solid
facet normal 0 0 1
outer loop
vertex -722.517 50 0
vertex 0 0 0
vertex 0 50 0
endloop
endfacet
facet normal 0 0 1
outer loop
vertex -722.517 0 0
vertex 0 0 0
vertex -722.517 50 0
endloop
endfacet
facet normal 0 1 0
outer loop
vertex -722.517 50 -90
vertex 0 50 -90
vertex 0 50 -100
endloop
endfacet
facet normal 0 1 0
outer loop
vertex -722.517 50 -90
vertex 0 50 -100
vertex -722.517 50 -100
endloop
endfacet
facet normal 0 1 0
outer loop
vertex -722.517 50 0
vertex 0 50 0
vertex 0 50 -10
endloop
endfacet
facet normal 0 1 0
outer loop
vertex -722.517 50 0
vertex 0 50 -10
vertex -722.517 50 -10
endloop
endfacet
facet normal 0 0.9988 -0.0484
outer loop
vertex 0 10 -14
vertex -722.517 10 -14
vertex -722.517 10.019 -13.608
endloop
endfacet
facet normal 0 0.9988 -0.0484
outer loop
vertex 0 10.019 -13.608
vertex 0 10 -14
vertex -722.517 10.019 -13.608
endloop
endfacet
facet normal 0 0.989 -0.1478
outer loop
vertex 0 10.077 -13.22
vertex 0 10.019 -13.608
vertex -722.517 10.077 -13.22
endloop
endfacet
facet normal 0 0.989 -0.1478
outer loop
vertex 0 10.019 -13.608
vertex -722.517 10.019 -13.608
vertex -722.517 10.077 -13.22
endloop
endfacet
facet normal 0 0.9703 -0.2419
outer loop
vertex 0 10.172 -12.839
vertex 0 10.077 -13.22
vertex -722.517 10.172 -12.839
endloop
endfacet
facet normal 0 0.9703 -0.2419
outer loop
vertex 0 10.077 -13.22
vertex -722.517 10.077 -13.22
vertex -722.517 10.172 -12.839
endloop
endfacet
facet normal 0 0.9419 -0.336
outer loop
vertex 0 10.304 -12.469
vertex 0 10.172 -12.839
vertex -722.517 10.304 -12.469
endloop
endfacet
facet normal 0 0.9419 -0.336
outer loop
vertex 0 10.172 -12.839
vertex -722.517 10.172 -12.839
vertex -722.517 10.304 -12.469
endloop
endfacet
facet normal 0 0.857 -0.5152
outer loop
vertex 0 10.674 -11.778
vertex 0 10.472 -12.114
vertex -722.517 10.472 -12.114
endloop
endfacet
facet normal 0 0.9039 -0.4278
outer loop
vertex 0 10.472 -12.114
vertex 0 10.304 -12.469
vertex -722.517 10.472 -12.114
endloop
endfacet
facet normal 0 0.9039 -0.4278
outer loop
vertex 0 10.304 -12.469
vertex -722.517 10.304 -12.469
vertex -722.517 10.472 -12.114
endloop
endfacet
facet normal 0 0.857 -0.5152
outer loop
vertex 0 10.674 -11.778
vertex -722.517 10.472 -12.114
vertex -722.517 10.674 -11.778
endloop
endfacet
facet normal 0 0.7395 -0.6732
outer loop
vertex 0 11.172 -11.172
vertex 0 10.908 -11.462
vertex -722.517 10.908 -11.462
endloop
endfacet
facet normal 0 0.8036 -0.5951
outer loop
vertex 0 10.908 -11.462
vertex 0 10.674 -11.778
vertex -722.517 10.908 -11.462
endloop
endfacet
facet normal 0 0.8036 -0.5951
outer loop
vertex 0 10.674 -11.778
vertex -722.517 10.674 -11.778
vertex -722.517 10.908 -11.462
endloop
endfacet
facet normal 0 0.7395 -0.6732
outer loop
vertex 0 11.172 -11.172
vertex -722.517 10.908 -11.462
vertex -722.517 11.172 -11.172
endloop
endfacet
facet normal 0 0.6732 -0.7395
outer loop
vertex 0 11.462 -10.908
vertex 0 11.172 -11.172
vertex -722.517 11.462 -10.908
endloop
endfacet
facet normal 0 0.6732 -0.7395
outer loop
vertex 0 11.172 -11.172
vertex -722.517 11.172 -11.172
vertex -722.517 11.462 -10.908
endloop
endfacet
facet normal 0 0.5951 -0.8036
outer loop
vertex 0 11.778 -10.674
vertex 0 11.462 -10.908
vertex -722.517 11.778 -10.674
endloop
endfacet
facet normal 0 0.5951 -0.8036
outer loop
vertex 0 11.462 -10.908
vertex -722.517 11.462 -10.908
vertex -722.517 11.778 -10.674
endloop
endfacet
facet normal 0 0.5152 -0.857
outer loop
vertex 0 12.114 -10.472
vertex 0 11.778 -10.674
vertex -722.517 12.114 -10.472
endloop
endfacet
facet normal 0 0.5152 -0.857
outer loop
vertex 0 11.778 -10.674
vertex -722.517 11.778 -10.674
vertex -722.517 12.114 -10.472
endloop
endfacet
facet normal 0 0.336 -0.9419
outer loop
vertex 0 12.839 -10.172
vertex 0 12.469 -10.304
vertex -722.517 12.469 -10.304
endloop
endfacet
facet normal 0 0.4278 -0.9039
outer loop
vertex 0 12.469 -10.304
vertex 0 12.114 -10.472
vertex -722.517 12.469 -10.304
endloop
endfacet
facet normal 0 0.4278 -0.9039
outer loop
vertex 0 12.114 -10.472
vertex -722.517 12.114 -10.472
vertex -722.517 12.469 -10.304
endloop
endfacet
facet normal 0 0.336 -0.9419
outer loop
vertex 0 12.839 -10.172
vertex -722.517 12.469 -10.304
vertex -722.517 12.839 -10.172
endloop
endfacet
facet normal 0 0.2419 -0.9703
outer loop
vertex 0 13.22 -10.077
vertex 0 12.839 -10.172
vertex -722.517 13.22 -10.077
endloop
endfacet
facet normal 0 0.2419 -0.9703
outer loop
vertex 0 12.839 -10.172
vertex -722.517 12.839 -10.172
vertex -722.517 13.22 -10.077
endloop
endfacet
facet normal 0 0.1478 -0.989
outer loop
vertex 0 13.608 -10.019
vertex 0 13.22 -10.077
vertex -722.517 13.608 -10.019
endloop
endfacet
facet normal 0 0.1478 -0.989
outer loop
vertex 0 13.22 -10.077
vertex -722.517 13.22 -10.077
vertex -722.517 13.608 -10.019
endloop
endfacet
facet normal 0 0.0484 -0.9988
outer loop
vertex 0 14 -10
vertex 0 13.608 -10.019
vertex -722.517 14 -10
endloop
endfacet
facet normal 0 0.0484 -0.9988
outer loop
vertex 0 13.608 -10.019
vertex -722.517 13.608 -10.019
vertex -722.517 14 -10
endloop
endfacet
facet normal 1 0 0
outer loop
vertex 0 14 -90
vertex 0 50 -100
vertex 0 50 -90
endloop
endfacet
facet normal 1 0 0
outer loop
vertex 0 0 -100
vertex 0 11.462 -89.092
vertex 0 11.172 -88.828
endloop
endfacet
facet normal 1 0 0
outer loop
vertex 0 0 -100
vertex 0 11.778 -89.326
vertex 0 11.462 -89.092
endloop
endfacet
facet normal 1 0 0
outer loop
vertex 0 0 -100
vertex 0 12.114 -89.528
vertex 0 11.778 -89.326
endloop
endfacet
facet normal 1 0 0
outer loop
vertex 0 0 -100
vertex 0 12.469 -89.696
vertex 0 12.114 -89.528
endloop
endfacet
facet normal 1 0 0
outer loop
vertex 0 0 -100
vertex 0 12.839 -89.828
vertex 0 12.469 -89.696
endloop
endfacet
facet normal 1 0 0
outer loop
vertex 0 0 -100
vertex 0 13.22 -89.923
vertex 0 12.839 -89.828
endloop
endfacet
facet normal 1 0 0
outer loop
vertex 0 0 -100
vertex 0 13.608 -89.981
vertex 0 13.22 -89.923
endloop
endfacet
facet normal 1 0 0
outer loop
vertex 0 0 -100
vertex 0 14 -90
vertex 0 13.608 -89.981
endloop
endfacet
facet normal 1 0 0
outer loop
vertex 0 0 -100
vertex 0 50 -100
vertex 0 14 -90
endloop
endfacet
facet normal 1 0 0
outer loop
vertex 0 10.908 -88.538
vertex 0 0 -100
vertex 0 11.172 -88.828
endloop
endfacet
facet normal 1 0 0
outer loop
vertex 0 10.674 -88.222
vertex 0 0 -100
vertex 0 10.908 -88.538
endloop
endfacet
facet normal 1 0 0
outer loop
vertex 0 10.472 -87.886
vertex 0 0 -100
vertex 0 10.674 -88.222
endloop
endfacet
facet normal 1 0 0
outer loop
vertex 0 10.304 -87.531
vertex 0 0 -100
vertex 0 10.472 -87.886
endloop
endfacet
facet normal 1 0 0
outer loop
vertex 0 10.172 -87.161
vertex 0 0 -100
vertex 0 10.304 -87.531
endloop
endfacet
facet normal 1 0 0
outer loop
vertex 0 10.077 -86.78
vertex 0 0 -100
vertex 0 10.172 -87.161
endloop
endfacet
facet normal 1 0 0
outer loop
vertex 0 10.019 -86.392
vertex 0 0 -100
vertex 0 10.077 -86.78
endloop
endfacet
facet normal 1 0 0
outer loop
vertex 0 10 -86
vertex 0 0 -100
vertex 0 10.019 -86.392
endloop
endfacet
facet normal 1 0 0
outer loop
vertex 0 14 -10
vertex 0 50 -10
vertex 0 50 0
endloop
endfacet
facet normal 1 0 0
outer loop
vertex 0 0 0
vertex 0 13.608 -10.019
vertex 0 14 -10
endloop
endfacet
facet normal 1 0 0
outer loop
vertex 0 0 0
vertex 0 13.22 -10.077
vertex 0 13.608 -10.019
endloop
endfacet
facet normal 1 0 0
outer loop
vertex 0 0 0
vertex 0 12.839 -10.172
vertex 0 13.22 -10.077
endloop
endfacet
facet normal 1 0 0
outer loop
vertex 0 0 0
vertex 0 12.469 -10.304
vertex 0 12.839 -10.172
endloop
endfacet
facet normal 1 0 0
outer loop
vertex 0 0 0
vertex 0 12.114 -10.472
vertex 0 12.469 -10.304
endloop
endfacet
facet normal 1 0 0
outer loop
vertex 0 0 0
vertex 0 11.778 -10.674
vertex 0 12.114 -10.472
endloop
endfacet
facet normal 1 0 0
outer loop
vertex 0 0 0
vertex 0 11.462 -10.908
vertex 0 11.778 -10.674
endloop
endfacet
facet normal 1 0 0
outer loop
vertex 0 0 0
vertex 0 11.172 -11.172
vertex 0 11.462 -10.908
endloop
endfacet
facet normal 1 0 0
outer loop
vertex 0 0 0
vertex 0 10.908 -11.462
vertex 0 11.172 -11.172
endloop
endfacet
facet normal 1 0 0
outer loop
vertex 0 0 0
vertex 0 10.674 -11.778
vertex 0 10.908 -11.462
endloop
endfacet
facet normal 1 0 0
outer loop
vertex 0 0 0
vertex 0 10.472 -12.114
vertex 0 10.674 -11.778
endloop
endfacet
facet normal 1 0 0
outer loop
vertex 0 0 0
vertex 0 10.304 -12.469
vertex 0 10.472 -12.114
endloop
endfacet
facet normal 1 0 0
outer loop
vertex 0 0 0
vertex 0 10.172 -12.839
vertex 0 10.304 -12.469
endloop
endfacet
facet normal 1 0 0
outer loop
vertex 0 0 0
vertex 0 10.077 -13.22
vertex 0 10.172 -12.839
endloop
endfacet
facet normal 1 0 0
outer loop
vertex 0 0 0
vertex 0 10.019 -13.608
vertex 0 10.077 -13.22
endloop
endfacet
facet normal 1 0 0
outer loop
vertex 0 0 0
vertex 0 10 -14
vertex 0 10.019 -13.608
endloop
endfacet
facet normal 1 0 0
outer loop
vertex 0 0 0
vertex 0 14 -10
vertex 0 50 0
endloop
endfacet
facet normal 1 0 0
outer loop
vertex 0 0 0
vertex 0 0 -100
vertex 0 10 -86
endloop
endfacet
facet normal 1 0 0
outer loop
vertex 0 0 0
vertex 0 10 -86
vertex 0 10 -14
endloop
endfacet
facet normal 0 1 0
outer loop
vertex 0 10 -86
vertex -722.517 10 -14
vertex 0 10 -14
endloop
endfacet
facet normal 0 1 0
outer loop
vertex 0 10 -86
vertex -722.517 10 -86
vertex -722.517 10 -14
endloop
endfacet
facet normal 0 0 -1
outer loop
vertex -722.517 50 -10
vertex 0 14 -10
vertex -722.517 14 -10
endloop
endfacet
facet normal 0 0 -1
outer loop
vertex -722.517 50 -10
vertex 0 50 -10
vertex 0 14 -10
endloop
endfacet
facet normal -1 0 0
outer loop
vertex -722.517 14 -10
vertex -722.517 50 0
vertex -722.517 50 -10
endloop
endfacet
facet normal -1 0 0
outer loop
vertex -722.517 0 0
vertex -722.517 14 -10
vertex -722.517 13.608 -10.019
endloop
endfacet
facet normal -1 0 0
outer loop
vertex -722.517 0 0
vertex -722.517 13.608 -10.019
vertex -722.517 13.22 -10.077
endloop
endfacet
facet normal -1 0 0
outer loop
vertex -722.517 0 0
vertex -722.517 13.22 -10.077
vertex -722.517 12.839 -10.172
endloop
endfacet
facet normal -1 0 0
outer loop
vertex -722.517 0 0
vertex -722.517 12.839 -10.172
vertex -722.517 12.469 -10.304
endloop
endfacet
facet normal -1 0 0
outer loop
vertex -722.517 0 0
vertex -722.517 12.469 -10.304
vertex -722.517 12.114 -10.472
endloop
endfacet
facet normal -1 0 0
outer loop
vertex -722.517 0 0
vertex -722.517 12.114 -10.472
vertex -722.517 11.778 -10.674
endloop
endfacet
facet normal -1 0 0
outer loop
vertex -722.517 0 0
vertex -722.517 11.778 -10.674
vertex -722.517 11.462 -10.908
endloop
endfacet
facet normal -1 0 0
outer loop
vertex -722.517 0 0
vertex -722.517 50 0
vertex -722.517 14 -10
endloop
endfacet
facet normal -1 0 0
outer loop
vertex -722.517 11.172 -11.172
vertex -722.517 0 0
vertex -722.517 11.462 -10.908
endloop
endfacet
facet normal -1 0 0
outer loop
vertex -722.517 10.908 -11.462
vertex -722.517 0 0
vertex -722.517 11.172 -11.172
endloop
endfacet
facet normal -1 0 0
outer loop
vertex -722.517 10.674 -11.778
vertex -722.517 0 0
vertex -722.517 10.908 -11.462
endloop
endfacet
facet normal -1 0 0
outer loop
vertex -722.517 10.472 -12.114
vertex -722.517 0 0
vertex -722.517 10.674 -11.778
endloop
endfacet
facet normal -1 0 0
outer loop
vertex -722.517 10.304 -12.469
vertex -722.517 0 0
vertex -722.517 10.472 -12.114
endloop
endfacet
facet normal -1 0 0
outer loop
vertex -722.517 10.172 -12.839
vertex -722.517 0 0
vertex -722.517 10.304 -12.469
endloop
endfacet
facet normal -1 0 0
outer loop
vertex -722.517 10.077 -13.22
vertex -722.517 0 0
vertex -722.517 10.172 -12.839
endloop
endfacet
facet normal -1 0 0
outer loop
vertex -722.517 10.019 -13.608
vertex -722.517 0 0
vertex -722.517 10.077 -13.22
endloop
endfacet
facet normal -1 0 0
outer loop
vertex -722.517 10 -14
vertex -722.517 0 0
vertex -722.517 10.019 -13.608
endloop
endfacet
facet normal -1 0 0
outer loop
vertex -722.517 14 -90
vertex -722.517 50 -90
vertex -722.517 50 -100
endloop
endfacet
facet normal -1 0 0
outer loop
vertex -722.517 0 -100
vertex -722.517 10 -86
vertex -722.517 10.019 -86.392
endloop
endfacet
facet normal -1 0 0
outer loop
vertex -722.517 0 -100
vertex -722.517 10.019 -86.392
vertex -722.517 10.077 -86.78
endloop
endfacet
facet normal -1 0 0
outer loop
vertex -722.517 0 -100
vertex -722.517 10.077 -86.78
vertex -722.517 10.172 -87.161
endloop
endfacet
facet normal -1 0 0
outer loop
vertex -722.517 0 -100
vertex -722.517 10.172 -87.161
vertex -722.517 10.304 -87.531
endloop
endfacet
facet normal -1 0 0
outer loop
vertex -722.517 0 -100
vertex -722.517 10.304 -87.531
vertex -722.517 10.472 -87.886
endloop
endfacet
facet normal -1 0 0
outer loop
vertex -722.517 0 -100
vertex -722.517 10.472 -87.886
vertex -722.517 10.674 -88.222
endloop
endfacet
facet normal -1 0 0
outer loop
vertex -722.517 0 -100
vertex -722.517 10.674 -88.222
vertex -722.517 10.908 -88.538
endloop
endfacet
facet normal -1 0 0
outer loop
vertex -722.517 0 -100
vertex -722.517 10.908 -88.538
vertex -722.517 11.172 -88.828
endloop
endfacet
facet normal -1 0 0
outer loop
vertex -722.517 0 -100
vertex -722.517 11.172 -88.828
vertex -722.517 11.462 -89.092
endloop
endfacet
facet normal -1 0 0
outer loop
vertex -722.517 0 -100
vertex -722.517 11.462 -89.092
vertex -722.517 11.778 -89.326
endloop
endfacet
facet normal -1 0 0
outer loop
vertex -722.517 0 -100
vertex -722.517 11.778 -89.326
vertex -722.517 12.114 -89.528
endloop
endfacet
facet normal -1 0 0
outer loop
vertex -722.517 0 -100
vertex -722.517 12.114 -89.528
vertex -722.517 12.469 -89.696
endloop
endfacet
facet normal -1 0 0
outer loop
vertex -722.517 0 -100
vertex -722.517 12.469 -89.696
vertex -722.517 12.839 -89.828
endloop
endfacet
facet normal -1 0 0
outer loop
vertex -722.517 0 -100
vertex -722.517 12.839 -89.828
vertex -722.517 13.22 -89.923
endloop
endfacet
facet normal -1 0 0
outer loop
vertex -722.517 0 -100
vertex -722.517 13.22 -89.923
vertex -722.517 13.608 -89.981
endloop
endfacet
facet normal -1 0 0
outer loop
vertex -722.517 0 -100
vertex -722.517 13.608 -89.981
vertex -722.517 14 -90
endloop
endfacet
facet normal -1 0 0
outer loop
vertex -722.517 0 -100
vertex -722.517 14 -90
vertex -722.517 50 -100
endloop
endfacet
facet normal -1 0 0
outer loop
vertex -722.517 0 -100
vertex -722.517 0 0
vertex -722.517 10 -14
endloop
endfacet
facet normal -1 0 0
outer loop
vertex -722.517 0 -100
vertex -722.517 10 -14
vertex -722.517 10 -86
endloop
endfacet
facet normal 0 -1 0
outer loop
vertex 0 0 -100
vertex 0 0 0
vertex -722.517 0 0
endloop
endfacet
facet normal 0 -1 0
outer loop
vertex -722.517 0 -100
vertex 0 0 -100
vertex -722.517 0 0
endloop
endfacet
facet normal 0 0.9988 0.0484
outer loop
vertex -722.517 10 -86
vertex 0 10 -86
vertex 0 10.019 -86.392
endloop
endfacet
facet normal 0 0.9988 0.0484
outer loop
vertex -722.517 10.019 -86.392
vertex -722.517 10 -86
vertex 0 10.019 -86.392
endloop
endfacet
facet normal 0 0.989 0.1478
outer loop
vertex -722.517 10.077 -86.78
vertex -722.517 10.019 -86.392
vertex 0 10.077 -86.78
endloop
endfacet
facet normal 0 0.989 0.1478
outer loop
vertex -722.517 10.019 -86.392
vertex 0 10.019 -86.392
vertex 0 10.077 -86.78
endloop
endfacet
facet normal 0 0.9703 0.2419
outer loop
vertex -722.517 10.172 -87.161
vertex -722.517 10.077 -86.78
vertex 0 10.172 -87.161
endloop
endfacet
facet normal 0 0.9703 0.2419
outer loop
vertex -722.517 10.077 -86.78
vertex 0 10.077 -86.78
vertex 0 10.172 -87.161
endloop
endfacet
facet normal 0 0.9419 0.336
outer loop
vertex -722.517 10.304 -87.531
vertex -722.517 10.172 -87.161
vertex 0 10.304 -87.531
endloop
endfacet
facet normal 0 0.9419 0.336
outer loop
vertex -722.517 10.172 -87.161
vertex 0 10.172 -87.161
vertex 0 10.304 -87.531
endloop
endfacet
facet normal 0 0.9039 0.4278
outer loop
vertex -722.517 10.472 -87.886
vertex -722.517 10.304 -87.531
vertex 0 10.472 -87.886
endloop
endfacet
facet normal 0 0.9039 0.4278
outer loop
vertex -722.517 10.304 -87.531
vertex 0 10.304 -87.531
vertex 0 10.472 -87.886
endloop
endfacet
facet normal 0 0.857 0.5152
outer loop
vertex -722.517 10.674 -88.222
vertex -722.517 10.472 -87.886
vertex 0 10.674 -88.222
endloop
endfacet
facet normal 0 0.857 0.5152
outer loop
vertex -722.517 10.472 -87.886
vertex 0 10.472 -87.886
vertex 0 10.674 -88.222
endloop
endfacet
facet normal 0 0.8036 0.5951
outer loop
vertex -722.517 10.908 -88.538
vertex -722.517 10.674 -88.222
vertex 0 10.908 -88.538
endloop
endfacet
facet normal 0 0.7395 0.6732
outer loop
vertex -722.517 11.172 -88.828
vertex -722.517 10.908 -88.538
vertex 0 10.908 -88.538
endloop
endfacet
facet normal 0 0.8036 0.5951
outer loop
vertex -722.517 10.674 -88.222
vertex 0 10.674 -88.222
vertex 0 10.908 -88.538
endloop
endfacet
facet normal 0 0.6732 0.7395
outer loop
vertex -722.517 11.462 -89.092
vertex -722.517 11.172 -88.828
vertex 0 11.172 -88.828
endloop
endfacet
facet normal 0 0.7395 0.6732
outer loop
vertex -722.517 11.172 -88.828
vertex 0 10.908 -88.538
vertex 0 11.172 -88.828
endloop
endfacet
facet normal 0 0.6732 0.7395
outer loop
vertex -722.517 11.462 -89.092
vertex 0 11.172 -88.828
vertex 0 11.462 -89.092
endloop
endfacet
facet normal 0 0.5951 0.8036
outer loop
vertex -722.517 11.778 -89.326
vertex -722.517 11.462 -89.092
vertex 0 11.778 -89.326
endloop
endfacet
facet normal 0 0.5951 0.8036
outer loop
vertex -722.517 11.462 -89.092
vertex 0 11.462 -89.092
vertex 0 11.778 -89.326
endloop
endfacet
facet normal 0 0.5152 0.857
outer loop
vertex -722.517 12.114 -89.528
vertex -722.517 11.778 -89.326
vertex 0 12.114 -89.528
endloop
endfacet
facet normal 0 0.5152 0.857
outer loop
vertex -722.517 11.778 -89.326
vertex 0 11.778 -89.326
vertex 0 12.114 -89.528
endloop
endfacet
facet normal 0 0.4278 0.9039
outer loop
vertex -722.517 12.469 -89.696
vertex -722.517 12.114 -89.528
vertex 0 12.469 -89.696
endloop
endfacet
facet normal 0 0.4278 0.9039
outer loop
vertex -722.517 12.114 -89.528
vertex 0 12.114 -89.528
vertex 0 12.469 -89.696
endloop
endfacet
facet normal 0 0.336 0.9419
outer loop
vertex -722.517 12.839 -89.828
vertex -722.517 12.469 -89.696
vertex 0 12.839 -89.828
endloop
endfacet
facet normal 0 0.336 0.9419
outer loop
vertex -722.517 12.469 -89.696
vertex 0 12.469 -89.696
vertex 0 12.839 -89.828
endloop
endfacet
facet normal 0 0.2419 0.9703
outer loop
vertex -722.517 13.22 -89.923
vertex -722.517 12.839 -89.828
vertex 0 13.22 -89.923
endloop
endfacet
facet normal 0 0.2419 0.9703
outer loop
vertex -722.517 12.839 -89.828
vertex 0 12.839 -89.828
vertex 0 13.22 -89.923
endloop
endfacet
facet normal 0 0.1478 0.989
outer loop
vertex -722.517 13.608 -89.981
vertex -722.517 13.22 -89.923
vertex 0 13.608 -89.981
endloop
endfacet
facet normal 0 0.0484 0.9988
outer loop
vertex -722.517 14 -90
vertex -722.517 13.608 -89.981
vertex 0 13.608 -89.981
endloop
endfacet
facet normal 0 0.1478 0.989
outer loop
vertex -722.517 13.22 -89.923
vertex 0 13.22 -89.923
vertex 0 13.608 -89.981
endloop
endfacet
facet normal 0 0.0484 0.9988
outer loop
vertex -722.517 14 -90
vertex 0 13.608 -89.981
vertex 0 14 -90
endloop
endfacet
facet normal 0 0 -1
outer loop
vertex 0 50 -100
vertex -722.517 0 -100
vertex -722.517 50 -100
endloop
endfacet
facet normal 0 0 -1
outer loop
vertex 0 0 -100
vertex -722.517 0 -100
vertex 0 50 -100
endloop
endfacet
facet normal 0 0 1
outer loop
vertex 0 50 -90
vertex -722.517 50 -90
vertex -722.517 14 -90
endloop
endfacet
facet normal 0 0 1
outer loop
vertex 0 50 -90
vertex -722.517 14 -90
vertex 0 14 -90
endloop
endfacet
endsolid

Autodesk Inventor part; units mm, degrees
ref_plane "YZ Plane" through (0, 0, 0) normal (1, 0, 0) x (0, 1, 0)
ref_plane "XZ Plane" through (0, 0, 0) normal (0, 1, 0) x (-1, 0, 0)
ref_plane "XY Plane" through (0, 0, 0) normal (0, 0, 1) x (1, 0, 0)
sketch "Sketch1" plane through (0, 0, 0) normal (0, 1, 0) x (-1, 0, 0)
  line L0 (0, 0) -> (722.517, 0)
  line L1 (722.517, 0) -> (722.517, -100)
  line L2 (722.517, -100) -> (0, -100)
  line L3 (0, -100) -> (0, 0)
  dimension "d0" = 722.517
  dimension "d1" = 100
extrude "Extrusion1" add sketch "Sketch1" along normal blind 50
sketch "Sketch2" plane through (0, 50, 0) normal (0, 1, 0) x (1, 0, 0)
  line L0 (0, 0) -> (0, 100) projected
  line L1 (-722.517, 100) -> (-722.517, 0) projected
  line L2 (0, 10) -> (-722.517, 10)
  line L3 (-722.517, 10) -> (-722.517, 90)
  line L4 (-722.517, 90) -> (0, 90)
  line L5 (0, 90) -> (0, 10)
  dimension "d4" = 80
extrude "Extrusion2" cut sketch "Sketch2" against normal blind 40
fillet "Fillet1" radius 4 2 edges at (-361.2585, 10, -90) (-361.2585, 10, -10)
equation "\"BendRadius\" = Thickness"
equation "\"BendReliefWidth\" = Thickness"
equation "\"BendReliefDepth\" = 0.5 * Thickness"
equation "\"CornerReliefSize\" = 4 * Thickness"
equation "\"MinimumRemnant\" = 2 * Thickness"
equation "\"TransitionRadius\" = BendRadius"
equation "\"JacobiRadiusSize\" = BendRadius"
equation "\"GapSize\" = Thickness"
equation "\"Thickness\" = 0.5"
properties part number "Base4"
